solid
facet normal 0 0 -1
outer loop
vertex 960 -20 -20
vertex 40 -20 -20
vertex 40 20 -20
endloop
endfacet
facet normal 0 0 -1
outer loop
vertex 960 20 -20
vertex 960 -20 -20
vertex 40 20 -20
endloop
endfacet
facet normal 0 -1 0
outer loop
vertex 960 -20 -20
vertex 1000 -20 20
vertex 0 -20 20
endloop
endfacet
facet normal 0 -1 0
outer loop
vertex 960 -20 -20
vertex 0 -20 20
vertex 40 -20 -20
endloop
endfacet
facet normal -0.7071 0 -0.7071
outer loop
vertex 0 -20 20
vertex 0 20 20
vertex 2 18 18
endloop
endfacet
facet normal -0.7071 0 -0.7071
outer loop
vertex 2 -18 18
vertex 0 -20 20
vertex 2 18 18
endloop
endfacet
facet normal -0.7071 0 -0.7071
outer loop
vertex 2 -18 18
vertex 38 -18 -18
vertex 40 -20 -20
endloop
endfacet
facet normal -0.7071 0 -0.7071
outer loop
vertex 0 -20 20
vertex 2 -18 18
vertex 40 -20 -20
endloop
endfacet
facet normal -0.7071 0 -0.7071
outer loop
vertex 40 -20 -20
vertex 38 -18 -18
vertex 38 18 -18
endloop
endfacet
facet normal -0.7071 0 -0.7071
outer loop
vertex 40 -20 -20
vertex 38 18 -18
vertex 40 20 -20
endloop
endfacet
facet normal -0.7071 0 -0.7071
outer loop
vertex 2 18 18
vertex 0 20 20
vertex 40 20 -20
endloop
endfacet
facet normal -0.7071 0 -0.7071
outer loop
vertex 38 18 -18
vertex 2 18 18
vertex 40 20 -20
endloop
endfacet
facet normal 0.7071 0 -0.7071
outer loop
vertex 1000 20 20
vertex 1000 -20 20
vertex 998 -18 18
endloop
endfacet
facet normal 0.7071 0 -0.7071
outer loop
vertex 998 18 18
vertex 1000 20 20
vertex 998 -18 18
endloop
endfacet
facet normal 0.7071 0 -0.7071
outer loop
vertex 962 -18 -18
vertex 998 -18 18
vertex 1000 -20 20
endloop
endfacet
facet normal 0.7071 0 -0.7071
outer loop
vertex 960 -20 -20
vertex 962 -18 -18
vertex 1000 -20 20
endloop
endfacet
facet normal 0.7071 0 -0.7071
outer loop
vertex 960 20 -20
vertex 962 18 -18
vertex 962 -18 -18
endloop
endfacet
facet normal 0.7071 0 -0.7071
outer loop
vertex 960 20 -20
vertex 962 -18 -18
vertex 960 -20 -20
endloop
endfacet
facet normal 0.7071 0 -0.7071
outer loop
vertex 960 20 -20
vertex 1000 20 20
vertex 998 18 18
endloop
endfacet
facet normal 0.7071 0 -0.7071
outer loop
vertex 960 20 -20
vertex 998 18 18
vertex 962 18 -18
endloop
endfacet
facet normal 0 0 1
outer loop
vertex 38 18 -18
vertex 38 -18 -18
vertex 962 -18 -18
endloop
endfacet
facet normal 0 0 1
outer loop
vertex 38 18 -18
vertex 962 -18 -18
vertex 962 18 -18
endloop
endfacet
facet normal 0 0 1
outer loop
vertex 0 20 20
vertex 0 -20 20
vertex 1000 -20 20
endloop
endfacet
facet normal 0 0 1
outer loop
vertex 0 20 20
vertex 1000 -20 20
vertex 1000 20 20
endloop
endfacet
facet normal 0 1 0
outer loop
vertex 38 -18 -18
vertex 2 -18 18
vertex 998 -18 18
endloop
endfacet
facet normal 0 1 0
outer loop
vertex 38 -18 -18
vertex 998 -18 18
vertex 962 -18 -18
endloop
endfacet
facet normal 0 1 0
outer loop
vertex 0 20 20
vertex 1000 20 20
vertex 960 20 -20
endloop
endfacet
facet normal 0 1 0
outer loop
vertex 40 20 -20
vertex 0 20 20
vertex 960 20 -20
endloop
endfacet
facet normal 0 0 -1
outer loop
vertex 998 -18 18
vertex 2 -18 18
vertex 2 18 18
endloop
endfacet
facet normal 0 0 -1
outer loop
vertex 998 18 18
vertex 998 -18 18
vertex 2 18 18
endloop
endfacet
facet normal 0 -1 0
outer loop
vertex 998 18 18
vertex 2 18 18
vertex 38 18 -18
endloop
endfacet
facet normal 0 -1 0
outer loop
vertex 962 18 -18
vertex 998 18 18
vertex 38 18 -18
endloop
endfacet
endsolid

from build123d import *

# Parameters (mm, degrees)
CROQUIS1_W              = 40
CROQUIS1_H              = 40
CROQUIS1_W_2            = 36
CROQUIS1_H_2            = 36
SALIENTE_EXTRUIR1_DEPTH = 1000
CORTAR_EXTRUIR1_DEPTH   = 41


with BuildPart() as part:
    # Croquis1 → Saliente-Extruir1 (new body)
    with BuildSketch(Plane(origin=(0, 0, 0), x_dir=(0, 0, -1), z_dir=(1, 0, 0))):
        Rectangle(CROQUIS1_W, CROQUIS1_H)
        Rectangle(CROQUIS1_W_2, CROQUIS1_H_2, mode=Mode.SUBTRACT)
    extrude(amount=SALIENTE_EXTRUIR1_DEPTH)

    # Croquis2 → Cortar-Extruir1 (cut, through all)
    with BuildSketch(Plane(origin=(0, 20, 0), x_dir=(1, 0, 0), z_dir=(0, 1, 0))):
        Polygon((0, -20), (40, 20), (0, 20), align=None)
        Polygon((1000, 20), (1000, -20), (960, 20), align=None)
    extrude(amount=-CORTAR_EXTRUIR1_DEPTH, mode=Mode.SUBTRACT)


solid = part.part
